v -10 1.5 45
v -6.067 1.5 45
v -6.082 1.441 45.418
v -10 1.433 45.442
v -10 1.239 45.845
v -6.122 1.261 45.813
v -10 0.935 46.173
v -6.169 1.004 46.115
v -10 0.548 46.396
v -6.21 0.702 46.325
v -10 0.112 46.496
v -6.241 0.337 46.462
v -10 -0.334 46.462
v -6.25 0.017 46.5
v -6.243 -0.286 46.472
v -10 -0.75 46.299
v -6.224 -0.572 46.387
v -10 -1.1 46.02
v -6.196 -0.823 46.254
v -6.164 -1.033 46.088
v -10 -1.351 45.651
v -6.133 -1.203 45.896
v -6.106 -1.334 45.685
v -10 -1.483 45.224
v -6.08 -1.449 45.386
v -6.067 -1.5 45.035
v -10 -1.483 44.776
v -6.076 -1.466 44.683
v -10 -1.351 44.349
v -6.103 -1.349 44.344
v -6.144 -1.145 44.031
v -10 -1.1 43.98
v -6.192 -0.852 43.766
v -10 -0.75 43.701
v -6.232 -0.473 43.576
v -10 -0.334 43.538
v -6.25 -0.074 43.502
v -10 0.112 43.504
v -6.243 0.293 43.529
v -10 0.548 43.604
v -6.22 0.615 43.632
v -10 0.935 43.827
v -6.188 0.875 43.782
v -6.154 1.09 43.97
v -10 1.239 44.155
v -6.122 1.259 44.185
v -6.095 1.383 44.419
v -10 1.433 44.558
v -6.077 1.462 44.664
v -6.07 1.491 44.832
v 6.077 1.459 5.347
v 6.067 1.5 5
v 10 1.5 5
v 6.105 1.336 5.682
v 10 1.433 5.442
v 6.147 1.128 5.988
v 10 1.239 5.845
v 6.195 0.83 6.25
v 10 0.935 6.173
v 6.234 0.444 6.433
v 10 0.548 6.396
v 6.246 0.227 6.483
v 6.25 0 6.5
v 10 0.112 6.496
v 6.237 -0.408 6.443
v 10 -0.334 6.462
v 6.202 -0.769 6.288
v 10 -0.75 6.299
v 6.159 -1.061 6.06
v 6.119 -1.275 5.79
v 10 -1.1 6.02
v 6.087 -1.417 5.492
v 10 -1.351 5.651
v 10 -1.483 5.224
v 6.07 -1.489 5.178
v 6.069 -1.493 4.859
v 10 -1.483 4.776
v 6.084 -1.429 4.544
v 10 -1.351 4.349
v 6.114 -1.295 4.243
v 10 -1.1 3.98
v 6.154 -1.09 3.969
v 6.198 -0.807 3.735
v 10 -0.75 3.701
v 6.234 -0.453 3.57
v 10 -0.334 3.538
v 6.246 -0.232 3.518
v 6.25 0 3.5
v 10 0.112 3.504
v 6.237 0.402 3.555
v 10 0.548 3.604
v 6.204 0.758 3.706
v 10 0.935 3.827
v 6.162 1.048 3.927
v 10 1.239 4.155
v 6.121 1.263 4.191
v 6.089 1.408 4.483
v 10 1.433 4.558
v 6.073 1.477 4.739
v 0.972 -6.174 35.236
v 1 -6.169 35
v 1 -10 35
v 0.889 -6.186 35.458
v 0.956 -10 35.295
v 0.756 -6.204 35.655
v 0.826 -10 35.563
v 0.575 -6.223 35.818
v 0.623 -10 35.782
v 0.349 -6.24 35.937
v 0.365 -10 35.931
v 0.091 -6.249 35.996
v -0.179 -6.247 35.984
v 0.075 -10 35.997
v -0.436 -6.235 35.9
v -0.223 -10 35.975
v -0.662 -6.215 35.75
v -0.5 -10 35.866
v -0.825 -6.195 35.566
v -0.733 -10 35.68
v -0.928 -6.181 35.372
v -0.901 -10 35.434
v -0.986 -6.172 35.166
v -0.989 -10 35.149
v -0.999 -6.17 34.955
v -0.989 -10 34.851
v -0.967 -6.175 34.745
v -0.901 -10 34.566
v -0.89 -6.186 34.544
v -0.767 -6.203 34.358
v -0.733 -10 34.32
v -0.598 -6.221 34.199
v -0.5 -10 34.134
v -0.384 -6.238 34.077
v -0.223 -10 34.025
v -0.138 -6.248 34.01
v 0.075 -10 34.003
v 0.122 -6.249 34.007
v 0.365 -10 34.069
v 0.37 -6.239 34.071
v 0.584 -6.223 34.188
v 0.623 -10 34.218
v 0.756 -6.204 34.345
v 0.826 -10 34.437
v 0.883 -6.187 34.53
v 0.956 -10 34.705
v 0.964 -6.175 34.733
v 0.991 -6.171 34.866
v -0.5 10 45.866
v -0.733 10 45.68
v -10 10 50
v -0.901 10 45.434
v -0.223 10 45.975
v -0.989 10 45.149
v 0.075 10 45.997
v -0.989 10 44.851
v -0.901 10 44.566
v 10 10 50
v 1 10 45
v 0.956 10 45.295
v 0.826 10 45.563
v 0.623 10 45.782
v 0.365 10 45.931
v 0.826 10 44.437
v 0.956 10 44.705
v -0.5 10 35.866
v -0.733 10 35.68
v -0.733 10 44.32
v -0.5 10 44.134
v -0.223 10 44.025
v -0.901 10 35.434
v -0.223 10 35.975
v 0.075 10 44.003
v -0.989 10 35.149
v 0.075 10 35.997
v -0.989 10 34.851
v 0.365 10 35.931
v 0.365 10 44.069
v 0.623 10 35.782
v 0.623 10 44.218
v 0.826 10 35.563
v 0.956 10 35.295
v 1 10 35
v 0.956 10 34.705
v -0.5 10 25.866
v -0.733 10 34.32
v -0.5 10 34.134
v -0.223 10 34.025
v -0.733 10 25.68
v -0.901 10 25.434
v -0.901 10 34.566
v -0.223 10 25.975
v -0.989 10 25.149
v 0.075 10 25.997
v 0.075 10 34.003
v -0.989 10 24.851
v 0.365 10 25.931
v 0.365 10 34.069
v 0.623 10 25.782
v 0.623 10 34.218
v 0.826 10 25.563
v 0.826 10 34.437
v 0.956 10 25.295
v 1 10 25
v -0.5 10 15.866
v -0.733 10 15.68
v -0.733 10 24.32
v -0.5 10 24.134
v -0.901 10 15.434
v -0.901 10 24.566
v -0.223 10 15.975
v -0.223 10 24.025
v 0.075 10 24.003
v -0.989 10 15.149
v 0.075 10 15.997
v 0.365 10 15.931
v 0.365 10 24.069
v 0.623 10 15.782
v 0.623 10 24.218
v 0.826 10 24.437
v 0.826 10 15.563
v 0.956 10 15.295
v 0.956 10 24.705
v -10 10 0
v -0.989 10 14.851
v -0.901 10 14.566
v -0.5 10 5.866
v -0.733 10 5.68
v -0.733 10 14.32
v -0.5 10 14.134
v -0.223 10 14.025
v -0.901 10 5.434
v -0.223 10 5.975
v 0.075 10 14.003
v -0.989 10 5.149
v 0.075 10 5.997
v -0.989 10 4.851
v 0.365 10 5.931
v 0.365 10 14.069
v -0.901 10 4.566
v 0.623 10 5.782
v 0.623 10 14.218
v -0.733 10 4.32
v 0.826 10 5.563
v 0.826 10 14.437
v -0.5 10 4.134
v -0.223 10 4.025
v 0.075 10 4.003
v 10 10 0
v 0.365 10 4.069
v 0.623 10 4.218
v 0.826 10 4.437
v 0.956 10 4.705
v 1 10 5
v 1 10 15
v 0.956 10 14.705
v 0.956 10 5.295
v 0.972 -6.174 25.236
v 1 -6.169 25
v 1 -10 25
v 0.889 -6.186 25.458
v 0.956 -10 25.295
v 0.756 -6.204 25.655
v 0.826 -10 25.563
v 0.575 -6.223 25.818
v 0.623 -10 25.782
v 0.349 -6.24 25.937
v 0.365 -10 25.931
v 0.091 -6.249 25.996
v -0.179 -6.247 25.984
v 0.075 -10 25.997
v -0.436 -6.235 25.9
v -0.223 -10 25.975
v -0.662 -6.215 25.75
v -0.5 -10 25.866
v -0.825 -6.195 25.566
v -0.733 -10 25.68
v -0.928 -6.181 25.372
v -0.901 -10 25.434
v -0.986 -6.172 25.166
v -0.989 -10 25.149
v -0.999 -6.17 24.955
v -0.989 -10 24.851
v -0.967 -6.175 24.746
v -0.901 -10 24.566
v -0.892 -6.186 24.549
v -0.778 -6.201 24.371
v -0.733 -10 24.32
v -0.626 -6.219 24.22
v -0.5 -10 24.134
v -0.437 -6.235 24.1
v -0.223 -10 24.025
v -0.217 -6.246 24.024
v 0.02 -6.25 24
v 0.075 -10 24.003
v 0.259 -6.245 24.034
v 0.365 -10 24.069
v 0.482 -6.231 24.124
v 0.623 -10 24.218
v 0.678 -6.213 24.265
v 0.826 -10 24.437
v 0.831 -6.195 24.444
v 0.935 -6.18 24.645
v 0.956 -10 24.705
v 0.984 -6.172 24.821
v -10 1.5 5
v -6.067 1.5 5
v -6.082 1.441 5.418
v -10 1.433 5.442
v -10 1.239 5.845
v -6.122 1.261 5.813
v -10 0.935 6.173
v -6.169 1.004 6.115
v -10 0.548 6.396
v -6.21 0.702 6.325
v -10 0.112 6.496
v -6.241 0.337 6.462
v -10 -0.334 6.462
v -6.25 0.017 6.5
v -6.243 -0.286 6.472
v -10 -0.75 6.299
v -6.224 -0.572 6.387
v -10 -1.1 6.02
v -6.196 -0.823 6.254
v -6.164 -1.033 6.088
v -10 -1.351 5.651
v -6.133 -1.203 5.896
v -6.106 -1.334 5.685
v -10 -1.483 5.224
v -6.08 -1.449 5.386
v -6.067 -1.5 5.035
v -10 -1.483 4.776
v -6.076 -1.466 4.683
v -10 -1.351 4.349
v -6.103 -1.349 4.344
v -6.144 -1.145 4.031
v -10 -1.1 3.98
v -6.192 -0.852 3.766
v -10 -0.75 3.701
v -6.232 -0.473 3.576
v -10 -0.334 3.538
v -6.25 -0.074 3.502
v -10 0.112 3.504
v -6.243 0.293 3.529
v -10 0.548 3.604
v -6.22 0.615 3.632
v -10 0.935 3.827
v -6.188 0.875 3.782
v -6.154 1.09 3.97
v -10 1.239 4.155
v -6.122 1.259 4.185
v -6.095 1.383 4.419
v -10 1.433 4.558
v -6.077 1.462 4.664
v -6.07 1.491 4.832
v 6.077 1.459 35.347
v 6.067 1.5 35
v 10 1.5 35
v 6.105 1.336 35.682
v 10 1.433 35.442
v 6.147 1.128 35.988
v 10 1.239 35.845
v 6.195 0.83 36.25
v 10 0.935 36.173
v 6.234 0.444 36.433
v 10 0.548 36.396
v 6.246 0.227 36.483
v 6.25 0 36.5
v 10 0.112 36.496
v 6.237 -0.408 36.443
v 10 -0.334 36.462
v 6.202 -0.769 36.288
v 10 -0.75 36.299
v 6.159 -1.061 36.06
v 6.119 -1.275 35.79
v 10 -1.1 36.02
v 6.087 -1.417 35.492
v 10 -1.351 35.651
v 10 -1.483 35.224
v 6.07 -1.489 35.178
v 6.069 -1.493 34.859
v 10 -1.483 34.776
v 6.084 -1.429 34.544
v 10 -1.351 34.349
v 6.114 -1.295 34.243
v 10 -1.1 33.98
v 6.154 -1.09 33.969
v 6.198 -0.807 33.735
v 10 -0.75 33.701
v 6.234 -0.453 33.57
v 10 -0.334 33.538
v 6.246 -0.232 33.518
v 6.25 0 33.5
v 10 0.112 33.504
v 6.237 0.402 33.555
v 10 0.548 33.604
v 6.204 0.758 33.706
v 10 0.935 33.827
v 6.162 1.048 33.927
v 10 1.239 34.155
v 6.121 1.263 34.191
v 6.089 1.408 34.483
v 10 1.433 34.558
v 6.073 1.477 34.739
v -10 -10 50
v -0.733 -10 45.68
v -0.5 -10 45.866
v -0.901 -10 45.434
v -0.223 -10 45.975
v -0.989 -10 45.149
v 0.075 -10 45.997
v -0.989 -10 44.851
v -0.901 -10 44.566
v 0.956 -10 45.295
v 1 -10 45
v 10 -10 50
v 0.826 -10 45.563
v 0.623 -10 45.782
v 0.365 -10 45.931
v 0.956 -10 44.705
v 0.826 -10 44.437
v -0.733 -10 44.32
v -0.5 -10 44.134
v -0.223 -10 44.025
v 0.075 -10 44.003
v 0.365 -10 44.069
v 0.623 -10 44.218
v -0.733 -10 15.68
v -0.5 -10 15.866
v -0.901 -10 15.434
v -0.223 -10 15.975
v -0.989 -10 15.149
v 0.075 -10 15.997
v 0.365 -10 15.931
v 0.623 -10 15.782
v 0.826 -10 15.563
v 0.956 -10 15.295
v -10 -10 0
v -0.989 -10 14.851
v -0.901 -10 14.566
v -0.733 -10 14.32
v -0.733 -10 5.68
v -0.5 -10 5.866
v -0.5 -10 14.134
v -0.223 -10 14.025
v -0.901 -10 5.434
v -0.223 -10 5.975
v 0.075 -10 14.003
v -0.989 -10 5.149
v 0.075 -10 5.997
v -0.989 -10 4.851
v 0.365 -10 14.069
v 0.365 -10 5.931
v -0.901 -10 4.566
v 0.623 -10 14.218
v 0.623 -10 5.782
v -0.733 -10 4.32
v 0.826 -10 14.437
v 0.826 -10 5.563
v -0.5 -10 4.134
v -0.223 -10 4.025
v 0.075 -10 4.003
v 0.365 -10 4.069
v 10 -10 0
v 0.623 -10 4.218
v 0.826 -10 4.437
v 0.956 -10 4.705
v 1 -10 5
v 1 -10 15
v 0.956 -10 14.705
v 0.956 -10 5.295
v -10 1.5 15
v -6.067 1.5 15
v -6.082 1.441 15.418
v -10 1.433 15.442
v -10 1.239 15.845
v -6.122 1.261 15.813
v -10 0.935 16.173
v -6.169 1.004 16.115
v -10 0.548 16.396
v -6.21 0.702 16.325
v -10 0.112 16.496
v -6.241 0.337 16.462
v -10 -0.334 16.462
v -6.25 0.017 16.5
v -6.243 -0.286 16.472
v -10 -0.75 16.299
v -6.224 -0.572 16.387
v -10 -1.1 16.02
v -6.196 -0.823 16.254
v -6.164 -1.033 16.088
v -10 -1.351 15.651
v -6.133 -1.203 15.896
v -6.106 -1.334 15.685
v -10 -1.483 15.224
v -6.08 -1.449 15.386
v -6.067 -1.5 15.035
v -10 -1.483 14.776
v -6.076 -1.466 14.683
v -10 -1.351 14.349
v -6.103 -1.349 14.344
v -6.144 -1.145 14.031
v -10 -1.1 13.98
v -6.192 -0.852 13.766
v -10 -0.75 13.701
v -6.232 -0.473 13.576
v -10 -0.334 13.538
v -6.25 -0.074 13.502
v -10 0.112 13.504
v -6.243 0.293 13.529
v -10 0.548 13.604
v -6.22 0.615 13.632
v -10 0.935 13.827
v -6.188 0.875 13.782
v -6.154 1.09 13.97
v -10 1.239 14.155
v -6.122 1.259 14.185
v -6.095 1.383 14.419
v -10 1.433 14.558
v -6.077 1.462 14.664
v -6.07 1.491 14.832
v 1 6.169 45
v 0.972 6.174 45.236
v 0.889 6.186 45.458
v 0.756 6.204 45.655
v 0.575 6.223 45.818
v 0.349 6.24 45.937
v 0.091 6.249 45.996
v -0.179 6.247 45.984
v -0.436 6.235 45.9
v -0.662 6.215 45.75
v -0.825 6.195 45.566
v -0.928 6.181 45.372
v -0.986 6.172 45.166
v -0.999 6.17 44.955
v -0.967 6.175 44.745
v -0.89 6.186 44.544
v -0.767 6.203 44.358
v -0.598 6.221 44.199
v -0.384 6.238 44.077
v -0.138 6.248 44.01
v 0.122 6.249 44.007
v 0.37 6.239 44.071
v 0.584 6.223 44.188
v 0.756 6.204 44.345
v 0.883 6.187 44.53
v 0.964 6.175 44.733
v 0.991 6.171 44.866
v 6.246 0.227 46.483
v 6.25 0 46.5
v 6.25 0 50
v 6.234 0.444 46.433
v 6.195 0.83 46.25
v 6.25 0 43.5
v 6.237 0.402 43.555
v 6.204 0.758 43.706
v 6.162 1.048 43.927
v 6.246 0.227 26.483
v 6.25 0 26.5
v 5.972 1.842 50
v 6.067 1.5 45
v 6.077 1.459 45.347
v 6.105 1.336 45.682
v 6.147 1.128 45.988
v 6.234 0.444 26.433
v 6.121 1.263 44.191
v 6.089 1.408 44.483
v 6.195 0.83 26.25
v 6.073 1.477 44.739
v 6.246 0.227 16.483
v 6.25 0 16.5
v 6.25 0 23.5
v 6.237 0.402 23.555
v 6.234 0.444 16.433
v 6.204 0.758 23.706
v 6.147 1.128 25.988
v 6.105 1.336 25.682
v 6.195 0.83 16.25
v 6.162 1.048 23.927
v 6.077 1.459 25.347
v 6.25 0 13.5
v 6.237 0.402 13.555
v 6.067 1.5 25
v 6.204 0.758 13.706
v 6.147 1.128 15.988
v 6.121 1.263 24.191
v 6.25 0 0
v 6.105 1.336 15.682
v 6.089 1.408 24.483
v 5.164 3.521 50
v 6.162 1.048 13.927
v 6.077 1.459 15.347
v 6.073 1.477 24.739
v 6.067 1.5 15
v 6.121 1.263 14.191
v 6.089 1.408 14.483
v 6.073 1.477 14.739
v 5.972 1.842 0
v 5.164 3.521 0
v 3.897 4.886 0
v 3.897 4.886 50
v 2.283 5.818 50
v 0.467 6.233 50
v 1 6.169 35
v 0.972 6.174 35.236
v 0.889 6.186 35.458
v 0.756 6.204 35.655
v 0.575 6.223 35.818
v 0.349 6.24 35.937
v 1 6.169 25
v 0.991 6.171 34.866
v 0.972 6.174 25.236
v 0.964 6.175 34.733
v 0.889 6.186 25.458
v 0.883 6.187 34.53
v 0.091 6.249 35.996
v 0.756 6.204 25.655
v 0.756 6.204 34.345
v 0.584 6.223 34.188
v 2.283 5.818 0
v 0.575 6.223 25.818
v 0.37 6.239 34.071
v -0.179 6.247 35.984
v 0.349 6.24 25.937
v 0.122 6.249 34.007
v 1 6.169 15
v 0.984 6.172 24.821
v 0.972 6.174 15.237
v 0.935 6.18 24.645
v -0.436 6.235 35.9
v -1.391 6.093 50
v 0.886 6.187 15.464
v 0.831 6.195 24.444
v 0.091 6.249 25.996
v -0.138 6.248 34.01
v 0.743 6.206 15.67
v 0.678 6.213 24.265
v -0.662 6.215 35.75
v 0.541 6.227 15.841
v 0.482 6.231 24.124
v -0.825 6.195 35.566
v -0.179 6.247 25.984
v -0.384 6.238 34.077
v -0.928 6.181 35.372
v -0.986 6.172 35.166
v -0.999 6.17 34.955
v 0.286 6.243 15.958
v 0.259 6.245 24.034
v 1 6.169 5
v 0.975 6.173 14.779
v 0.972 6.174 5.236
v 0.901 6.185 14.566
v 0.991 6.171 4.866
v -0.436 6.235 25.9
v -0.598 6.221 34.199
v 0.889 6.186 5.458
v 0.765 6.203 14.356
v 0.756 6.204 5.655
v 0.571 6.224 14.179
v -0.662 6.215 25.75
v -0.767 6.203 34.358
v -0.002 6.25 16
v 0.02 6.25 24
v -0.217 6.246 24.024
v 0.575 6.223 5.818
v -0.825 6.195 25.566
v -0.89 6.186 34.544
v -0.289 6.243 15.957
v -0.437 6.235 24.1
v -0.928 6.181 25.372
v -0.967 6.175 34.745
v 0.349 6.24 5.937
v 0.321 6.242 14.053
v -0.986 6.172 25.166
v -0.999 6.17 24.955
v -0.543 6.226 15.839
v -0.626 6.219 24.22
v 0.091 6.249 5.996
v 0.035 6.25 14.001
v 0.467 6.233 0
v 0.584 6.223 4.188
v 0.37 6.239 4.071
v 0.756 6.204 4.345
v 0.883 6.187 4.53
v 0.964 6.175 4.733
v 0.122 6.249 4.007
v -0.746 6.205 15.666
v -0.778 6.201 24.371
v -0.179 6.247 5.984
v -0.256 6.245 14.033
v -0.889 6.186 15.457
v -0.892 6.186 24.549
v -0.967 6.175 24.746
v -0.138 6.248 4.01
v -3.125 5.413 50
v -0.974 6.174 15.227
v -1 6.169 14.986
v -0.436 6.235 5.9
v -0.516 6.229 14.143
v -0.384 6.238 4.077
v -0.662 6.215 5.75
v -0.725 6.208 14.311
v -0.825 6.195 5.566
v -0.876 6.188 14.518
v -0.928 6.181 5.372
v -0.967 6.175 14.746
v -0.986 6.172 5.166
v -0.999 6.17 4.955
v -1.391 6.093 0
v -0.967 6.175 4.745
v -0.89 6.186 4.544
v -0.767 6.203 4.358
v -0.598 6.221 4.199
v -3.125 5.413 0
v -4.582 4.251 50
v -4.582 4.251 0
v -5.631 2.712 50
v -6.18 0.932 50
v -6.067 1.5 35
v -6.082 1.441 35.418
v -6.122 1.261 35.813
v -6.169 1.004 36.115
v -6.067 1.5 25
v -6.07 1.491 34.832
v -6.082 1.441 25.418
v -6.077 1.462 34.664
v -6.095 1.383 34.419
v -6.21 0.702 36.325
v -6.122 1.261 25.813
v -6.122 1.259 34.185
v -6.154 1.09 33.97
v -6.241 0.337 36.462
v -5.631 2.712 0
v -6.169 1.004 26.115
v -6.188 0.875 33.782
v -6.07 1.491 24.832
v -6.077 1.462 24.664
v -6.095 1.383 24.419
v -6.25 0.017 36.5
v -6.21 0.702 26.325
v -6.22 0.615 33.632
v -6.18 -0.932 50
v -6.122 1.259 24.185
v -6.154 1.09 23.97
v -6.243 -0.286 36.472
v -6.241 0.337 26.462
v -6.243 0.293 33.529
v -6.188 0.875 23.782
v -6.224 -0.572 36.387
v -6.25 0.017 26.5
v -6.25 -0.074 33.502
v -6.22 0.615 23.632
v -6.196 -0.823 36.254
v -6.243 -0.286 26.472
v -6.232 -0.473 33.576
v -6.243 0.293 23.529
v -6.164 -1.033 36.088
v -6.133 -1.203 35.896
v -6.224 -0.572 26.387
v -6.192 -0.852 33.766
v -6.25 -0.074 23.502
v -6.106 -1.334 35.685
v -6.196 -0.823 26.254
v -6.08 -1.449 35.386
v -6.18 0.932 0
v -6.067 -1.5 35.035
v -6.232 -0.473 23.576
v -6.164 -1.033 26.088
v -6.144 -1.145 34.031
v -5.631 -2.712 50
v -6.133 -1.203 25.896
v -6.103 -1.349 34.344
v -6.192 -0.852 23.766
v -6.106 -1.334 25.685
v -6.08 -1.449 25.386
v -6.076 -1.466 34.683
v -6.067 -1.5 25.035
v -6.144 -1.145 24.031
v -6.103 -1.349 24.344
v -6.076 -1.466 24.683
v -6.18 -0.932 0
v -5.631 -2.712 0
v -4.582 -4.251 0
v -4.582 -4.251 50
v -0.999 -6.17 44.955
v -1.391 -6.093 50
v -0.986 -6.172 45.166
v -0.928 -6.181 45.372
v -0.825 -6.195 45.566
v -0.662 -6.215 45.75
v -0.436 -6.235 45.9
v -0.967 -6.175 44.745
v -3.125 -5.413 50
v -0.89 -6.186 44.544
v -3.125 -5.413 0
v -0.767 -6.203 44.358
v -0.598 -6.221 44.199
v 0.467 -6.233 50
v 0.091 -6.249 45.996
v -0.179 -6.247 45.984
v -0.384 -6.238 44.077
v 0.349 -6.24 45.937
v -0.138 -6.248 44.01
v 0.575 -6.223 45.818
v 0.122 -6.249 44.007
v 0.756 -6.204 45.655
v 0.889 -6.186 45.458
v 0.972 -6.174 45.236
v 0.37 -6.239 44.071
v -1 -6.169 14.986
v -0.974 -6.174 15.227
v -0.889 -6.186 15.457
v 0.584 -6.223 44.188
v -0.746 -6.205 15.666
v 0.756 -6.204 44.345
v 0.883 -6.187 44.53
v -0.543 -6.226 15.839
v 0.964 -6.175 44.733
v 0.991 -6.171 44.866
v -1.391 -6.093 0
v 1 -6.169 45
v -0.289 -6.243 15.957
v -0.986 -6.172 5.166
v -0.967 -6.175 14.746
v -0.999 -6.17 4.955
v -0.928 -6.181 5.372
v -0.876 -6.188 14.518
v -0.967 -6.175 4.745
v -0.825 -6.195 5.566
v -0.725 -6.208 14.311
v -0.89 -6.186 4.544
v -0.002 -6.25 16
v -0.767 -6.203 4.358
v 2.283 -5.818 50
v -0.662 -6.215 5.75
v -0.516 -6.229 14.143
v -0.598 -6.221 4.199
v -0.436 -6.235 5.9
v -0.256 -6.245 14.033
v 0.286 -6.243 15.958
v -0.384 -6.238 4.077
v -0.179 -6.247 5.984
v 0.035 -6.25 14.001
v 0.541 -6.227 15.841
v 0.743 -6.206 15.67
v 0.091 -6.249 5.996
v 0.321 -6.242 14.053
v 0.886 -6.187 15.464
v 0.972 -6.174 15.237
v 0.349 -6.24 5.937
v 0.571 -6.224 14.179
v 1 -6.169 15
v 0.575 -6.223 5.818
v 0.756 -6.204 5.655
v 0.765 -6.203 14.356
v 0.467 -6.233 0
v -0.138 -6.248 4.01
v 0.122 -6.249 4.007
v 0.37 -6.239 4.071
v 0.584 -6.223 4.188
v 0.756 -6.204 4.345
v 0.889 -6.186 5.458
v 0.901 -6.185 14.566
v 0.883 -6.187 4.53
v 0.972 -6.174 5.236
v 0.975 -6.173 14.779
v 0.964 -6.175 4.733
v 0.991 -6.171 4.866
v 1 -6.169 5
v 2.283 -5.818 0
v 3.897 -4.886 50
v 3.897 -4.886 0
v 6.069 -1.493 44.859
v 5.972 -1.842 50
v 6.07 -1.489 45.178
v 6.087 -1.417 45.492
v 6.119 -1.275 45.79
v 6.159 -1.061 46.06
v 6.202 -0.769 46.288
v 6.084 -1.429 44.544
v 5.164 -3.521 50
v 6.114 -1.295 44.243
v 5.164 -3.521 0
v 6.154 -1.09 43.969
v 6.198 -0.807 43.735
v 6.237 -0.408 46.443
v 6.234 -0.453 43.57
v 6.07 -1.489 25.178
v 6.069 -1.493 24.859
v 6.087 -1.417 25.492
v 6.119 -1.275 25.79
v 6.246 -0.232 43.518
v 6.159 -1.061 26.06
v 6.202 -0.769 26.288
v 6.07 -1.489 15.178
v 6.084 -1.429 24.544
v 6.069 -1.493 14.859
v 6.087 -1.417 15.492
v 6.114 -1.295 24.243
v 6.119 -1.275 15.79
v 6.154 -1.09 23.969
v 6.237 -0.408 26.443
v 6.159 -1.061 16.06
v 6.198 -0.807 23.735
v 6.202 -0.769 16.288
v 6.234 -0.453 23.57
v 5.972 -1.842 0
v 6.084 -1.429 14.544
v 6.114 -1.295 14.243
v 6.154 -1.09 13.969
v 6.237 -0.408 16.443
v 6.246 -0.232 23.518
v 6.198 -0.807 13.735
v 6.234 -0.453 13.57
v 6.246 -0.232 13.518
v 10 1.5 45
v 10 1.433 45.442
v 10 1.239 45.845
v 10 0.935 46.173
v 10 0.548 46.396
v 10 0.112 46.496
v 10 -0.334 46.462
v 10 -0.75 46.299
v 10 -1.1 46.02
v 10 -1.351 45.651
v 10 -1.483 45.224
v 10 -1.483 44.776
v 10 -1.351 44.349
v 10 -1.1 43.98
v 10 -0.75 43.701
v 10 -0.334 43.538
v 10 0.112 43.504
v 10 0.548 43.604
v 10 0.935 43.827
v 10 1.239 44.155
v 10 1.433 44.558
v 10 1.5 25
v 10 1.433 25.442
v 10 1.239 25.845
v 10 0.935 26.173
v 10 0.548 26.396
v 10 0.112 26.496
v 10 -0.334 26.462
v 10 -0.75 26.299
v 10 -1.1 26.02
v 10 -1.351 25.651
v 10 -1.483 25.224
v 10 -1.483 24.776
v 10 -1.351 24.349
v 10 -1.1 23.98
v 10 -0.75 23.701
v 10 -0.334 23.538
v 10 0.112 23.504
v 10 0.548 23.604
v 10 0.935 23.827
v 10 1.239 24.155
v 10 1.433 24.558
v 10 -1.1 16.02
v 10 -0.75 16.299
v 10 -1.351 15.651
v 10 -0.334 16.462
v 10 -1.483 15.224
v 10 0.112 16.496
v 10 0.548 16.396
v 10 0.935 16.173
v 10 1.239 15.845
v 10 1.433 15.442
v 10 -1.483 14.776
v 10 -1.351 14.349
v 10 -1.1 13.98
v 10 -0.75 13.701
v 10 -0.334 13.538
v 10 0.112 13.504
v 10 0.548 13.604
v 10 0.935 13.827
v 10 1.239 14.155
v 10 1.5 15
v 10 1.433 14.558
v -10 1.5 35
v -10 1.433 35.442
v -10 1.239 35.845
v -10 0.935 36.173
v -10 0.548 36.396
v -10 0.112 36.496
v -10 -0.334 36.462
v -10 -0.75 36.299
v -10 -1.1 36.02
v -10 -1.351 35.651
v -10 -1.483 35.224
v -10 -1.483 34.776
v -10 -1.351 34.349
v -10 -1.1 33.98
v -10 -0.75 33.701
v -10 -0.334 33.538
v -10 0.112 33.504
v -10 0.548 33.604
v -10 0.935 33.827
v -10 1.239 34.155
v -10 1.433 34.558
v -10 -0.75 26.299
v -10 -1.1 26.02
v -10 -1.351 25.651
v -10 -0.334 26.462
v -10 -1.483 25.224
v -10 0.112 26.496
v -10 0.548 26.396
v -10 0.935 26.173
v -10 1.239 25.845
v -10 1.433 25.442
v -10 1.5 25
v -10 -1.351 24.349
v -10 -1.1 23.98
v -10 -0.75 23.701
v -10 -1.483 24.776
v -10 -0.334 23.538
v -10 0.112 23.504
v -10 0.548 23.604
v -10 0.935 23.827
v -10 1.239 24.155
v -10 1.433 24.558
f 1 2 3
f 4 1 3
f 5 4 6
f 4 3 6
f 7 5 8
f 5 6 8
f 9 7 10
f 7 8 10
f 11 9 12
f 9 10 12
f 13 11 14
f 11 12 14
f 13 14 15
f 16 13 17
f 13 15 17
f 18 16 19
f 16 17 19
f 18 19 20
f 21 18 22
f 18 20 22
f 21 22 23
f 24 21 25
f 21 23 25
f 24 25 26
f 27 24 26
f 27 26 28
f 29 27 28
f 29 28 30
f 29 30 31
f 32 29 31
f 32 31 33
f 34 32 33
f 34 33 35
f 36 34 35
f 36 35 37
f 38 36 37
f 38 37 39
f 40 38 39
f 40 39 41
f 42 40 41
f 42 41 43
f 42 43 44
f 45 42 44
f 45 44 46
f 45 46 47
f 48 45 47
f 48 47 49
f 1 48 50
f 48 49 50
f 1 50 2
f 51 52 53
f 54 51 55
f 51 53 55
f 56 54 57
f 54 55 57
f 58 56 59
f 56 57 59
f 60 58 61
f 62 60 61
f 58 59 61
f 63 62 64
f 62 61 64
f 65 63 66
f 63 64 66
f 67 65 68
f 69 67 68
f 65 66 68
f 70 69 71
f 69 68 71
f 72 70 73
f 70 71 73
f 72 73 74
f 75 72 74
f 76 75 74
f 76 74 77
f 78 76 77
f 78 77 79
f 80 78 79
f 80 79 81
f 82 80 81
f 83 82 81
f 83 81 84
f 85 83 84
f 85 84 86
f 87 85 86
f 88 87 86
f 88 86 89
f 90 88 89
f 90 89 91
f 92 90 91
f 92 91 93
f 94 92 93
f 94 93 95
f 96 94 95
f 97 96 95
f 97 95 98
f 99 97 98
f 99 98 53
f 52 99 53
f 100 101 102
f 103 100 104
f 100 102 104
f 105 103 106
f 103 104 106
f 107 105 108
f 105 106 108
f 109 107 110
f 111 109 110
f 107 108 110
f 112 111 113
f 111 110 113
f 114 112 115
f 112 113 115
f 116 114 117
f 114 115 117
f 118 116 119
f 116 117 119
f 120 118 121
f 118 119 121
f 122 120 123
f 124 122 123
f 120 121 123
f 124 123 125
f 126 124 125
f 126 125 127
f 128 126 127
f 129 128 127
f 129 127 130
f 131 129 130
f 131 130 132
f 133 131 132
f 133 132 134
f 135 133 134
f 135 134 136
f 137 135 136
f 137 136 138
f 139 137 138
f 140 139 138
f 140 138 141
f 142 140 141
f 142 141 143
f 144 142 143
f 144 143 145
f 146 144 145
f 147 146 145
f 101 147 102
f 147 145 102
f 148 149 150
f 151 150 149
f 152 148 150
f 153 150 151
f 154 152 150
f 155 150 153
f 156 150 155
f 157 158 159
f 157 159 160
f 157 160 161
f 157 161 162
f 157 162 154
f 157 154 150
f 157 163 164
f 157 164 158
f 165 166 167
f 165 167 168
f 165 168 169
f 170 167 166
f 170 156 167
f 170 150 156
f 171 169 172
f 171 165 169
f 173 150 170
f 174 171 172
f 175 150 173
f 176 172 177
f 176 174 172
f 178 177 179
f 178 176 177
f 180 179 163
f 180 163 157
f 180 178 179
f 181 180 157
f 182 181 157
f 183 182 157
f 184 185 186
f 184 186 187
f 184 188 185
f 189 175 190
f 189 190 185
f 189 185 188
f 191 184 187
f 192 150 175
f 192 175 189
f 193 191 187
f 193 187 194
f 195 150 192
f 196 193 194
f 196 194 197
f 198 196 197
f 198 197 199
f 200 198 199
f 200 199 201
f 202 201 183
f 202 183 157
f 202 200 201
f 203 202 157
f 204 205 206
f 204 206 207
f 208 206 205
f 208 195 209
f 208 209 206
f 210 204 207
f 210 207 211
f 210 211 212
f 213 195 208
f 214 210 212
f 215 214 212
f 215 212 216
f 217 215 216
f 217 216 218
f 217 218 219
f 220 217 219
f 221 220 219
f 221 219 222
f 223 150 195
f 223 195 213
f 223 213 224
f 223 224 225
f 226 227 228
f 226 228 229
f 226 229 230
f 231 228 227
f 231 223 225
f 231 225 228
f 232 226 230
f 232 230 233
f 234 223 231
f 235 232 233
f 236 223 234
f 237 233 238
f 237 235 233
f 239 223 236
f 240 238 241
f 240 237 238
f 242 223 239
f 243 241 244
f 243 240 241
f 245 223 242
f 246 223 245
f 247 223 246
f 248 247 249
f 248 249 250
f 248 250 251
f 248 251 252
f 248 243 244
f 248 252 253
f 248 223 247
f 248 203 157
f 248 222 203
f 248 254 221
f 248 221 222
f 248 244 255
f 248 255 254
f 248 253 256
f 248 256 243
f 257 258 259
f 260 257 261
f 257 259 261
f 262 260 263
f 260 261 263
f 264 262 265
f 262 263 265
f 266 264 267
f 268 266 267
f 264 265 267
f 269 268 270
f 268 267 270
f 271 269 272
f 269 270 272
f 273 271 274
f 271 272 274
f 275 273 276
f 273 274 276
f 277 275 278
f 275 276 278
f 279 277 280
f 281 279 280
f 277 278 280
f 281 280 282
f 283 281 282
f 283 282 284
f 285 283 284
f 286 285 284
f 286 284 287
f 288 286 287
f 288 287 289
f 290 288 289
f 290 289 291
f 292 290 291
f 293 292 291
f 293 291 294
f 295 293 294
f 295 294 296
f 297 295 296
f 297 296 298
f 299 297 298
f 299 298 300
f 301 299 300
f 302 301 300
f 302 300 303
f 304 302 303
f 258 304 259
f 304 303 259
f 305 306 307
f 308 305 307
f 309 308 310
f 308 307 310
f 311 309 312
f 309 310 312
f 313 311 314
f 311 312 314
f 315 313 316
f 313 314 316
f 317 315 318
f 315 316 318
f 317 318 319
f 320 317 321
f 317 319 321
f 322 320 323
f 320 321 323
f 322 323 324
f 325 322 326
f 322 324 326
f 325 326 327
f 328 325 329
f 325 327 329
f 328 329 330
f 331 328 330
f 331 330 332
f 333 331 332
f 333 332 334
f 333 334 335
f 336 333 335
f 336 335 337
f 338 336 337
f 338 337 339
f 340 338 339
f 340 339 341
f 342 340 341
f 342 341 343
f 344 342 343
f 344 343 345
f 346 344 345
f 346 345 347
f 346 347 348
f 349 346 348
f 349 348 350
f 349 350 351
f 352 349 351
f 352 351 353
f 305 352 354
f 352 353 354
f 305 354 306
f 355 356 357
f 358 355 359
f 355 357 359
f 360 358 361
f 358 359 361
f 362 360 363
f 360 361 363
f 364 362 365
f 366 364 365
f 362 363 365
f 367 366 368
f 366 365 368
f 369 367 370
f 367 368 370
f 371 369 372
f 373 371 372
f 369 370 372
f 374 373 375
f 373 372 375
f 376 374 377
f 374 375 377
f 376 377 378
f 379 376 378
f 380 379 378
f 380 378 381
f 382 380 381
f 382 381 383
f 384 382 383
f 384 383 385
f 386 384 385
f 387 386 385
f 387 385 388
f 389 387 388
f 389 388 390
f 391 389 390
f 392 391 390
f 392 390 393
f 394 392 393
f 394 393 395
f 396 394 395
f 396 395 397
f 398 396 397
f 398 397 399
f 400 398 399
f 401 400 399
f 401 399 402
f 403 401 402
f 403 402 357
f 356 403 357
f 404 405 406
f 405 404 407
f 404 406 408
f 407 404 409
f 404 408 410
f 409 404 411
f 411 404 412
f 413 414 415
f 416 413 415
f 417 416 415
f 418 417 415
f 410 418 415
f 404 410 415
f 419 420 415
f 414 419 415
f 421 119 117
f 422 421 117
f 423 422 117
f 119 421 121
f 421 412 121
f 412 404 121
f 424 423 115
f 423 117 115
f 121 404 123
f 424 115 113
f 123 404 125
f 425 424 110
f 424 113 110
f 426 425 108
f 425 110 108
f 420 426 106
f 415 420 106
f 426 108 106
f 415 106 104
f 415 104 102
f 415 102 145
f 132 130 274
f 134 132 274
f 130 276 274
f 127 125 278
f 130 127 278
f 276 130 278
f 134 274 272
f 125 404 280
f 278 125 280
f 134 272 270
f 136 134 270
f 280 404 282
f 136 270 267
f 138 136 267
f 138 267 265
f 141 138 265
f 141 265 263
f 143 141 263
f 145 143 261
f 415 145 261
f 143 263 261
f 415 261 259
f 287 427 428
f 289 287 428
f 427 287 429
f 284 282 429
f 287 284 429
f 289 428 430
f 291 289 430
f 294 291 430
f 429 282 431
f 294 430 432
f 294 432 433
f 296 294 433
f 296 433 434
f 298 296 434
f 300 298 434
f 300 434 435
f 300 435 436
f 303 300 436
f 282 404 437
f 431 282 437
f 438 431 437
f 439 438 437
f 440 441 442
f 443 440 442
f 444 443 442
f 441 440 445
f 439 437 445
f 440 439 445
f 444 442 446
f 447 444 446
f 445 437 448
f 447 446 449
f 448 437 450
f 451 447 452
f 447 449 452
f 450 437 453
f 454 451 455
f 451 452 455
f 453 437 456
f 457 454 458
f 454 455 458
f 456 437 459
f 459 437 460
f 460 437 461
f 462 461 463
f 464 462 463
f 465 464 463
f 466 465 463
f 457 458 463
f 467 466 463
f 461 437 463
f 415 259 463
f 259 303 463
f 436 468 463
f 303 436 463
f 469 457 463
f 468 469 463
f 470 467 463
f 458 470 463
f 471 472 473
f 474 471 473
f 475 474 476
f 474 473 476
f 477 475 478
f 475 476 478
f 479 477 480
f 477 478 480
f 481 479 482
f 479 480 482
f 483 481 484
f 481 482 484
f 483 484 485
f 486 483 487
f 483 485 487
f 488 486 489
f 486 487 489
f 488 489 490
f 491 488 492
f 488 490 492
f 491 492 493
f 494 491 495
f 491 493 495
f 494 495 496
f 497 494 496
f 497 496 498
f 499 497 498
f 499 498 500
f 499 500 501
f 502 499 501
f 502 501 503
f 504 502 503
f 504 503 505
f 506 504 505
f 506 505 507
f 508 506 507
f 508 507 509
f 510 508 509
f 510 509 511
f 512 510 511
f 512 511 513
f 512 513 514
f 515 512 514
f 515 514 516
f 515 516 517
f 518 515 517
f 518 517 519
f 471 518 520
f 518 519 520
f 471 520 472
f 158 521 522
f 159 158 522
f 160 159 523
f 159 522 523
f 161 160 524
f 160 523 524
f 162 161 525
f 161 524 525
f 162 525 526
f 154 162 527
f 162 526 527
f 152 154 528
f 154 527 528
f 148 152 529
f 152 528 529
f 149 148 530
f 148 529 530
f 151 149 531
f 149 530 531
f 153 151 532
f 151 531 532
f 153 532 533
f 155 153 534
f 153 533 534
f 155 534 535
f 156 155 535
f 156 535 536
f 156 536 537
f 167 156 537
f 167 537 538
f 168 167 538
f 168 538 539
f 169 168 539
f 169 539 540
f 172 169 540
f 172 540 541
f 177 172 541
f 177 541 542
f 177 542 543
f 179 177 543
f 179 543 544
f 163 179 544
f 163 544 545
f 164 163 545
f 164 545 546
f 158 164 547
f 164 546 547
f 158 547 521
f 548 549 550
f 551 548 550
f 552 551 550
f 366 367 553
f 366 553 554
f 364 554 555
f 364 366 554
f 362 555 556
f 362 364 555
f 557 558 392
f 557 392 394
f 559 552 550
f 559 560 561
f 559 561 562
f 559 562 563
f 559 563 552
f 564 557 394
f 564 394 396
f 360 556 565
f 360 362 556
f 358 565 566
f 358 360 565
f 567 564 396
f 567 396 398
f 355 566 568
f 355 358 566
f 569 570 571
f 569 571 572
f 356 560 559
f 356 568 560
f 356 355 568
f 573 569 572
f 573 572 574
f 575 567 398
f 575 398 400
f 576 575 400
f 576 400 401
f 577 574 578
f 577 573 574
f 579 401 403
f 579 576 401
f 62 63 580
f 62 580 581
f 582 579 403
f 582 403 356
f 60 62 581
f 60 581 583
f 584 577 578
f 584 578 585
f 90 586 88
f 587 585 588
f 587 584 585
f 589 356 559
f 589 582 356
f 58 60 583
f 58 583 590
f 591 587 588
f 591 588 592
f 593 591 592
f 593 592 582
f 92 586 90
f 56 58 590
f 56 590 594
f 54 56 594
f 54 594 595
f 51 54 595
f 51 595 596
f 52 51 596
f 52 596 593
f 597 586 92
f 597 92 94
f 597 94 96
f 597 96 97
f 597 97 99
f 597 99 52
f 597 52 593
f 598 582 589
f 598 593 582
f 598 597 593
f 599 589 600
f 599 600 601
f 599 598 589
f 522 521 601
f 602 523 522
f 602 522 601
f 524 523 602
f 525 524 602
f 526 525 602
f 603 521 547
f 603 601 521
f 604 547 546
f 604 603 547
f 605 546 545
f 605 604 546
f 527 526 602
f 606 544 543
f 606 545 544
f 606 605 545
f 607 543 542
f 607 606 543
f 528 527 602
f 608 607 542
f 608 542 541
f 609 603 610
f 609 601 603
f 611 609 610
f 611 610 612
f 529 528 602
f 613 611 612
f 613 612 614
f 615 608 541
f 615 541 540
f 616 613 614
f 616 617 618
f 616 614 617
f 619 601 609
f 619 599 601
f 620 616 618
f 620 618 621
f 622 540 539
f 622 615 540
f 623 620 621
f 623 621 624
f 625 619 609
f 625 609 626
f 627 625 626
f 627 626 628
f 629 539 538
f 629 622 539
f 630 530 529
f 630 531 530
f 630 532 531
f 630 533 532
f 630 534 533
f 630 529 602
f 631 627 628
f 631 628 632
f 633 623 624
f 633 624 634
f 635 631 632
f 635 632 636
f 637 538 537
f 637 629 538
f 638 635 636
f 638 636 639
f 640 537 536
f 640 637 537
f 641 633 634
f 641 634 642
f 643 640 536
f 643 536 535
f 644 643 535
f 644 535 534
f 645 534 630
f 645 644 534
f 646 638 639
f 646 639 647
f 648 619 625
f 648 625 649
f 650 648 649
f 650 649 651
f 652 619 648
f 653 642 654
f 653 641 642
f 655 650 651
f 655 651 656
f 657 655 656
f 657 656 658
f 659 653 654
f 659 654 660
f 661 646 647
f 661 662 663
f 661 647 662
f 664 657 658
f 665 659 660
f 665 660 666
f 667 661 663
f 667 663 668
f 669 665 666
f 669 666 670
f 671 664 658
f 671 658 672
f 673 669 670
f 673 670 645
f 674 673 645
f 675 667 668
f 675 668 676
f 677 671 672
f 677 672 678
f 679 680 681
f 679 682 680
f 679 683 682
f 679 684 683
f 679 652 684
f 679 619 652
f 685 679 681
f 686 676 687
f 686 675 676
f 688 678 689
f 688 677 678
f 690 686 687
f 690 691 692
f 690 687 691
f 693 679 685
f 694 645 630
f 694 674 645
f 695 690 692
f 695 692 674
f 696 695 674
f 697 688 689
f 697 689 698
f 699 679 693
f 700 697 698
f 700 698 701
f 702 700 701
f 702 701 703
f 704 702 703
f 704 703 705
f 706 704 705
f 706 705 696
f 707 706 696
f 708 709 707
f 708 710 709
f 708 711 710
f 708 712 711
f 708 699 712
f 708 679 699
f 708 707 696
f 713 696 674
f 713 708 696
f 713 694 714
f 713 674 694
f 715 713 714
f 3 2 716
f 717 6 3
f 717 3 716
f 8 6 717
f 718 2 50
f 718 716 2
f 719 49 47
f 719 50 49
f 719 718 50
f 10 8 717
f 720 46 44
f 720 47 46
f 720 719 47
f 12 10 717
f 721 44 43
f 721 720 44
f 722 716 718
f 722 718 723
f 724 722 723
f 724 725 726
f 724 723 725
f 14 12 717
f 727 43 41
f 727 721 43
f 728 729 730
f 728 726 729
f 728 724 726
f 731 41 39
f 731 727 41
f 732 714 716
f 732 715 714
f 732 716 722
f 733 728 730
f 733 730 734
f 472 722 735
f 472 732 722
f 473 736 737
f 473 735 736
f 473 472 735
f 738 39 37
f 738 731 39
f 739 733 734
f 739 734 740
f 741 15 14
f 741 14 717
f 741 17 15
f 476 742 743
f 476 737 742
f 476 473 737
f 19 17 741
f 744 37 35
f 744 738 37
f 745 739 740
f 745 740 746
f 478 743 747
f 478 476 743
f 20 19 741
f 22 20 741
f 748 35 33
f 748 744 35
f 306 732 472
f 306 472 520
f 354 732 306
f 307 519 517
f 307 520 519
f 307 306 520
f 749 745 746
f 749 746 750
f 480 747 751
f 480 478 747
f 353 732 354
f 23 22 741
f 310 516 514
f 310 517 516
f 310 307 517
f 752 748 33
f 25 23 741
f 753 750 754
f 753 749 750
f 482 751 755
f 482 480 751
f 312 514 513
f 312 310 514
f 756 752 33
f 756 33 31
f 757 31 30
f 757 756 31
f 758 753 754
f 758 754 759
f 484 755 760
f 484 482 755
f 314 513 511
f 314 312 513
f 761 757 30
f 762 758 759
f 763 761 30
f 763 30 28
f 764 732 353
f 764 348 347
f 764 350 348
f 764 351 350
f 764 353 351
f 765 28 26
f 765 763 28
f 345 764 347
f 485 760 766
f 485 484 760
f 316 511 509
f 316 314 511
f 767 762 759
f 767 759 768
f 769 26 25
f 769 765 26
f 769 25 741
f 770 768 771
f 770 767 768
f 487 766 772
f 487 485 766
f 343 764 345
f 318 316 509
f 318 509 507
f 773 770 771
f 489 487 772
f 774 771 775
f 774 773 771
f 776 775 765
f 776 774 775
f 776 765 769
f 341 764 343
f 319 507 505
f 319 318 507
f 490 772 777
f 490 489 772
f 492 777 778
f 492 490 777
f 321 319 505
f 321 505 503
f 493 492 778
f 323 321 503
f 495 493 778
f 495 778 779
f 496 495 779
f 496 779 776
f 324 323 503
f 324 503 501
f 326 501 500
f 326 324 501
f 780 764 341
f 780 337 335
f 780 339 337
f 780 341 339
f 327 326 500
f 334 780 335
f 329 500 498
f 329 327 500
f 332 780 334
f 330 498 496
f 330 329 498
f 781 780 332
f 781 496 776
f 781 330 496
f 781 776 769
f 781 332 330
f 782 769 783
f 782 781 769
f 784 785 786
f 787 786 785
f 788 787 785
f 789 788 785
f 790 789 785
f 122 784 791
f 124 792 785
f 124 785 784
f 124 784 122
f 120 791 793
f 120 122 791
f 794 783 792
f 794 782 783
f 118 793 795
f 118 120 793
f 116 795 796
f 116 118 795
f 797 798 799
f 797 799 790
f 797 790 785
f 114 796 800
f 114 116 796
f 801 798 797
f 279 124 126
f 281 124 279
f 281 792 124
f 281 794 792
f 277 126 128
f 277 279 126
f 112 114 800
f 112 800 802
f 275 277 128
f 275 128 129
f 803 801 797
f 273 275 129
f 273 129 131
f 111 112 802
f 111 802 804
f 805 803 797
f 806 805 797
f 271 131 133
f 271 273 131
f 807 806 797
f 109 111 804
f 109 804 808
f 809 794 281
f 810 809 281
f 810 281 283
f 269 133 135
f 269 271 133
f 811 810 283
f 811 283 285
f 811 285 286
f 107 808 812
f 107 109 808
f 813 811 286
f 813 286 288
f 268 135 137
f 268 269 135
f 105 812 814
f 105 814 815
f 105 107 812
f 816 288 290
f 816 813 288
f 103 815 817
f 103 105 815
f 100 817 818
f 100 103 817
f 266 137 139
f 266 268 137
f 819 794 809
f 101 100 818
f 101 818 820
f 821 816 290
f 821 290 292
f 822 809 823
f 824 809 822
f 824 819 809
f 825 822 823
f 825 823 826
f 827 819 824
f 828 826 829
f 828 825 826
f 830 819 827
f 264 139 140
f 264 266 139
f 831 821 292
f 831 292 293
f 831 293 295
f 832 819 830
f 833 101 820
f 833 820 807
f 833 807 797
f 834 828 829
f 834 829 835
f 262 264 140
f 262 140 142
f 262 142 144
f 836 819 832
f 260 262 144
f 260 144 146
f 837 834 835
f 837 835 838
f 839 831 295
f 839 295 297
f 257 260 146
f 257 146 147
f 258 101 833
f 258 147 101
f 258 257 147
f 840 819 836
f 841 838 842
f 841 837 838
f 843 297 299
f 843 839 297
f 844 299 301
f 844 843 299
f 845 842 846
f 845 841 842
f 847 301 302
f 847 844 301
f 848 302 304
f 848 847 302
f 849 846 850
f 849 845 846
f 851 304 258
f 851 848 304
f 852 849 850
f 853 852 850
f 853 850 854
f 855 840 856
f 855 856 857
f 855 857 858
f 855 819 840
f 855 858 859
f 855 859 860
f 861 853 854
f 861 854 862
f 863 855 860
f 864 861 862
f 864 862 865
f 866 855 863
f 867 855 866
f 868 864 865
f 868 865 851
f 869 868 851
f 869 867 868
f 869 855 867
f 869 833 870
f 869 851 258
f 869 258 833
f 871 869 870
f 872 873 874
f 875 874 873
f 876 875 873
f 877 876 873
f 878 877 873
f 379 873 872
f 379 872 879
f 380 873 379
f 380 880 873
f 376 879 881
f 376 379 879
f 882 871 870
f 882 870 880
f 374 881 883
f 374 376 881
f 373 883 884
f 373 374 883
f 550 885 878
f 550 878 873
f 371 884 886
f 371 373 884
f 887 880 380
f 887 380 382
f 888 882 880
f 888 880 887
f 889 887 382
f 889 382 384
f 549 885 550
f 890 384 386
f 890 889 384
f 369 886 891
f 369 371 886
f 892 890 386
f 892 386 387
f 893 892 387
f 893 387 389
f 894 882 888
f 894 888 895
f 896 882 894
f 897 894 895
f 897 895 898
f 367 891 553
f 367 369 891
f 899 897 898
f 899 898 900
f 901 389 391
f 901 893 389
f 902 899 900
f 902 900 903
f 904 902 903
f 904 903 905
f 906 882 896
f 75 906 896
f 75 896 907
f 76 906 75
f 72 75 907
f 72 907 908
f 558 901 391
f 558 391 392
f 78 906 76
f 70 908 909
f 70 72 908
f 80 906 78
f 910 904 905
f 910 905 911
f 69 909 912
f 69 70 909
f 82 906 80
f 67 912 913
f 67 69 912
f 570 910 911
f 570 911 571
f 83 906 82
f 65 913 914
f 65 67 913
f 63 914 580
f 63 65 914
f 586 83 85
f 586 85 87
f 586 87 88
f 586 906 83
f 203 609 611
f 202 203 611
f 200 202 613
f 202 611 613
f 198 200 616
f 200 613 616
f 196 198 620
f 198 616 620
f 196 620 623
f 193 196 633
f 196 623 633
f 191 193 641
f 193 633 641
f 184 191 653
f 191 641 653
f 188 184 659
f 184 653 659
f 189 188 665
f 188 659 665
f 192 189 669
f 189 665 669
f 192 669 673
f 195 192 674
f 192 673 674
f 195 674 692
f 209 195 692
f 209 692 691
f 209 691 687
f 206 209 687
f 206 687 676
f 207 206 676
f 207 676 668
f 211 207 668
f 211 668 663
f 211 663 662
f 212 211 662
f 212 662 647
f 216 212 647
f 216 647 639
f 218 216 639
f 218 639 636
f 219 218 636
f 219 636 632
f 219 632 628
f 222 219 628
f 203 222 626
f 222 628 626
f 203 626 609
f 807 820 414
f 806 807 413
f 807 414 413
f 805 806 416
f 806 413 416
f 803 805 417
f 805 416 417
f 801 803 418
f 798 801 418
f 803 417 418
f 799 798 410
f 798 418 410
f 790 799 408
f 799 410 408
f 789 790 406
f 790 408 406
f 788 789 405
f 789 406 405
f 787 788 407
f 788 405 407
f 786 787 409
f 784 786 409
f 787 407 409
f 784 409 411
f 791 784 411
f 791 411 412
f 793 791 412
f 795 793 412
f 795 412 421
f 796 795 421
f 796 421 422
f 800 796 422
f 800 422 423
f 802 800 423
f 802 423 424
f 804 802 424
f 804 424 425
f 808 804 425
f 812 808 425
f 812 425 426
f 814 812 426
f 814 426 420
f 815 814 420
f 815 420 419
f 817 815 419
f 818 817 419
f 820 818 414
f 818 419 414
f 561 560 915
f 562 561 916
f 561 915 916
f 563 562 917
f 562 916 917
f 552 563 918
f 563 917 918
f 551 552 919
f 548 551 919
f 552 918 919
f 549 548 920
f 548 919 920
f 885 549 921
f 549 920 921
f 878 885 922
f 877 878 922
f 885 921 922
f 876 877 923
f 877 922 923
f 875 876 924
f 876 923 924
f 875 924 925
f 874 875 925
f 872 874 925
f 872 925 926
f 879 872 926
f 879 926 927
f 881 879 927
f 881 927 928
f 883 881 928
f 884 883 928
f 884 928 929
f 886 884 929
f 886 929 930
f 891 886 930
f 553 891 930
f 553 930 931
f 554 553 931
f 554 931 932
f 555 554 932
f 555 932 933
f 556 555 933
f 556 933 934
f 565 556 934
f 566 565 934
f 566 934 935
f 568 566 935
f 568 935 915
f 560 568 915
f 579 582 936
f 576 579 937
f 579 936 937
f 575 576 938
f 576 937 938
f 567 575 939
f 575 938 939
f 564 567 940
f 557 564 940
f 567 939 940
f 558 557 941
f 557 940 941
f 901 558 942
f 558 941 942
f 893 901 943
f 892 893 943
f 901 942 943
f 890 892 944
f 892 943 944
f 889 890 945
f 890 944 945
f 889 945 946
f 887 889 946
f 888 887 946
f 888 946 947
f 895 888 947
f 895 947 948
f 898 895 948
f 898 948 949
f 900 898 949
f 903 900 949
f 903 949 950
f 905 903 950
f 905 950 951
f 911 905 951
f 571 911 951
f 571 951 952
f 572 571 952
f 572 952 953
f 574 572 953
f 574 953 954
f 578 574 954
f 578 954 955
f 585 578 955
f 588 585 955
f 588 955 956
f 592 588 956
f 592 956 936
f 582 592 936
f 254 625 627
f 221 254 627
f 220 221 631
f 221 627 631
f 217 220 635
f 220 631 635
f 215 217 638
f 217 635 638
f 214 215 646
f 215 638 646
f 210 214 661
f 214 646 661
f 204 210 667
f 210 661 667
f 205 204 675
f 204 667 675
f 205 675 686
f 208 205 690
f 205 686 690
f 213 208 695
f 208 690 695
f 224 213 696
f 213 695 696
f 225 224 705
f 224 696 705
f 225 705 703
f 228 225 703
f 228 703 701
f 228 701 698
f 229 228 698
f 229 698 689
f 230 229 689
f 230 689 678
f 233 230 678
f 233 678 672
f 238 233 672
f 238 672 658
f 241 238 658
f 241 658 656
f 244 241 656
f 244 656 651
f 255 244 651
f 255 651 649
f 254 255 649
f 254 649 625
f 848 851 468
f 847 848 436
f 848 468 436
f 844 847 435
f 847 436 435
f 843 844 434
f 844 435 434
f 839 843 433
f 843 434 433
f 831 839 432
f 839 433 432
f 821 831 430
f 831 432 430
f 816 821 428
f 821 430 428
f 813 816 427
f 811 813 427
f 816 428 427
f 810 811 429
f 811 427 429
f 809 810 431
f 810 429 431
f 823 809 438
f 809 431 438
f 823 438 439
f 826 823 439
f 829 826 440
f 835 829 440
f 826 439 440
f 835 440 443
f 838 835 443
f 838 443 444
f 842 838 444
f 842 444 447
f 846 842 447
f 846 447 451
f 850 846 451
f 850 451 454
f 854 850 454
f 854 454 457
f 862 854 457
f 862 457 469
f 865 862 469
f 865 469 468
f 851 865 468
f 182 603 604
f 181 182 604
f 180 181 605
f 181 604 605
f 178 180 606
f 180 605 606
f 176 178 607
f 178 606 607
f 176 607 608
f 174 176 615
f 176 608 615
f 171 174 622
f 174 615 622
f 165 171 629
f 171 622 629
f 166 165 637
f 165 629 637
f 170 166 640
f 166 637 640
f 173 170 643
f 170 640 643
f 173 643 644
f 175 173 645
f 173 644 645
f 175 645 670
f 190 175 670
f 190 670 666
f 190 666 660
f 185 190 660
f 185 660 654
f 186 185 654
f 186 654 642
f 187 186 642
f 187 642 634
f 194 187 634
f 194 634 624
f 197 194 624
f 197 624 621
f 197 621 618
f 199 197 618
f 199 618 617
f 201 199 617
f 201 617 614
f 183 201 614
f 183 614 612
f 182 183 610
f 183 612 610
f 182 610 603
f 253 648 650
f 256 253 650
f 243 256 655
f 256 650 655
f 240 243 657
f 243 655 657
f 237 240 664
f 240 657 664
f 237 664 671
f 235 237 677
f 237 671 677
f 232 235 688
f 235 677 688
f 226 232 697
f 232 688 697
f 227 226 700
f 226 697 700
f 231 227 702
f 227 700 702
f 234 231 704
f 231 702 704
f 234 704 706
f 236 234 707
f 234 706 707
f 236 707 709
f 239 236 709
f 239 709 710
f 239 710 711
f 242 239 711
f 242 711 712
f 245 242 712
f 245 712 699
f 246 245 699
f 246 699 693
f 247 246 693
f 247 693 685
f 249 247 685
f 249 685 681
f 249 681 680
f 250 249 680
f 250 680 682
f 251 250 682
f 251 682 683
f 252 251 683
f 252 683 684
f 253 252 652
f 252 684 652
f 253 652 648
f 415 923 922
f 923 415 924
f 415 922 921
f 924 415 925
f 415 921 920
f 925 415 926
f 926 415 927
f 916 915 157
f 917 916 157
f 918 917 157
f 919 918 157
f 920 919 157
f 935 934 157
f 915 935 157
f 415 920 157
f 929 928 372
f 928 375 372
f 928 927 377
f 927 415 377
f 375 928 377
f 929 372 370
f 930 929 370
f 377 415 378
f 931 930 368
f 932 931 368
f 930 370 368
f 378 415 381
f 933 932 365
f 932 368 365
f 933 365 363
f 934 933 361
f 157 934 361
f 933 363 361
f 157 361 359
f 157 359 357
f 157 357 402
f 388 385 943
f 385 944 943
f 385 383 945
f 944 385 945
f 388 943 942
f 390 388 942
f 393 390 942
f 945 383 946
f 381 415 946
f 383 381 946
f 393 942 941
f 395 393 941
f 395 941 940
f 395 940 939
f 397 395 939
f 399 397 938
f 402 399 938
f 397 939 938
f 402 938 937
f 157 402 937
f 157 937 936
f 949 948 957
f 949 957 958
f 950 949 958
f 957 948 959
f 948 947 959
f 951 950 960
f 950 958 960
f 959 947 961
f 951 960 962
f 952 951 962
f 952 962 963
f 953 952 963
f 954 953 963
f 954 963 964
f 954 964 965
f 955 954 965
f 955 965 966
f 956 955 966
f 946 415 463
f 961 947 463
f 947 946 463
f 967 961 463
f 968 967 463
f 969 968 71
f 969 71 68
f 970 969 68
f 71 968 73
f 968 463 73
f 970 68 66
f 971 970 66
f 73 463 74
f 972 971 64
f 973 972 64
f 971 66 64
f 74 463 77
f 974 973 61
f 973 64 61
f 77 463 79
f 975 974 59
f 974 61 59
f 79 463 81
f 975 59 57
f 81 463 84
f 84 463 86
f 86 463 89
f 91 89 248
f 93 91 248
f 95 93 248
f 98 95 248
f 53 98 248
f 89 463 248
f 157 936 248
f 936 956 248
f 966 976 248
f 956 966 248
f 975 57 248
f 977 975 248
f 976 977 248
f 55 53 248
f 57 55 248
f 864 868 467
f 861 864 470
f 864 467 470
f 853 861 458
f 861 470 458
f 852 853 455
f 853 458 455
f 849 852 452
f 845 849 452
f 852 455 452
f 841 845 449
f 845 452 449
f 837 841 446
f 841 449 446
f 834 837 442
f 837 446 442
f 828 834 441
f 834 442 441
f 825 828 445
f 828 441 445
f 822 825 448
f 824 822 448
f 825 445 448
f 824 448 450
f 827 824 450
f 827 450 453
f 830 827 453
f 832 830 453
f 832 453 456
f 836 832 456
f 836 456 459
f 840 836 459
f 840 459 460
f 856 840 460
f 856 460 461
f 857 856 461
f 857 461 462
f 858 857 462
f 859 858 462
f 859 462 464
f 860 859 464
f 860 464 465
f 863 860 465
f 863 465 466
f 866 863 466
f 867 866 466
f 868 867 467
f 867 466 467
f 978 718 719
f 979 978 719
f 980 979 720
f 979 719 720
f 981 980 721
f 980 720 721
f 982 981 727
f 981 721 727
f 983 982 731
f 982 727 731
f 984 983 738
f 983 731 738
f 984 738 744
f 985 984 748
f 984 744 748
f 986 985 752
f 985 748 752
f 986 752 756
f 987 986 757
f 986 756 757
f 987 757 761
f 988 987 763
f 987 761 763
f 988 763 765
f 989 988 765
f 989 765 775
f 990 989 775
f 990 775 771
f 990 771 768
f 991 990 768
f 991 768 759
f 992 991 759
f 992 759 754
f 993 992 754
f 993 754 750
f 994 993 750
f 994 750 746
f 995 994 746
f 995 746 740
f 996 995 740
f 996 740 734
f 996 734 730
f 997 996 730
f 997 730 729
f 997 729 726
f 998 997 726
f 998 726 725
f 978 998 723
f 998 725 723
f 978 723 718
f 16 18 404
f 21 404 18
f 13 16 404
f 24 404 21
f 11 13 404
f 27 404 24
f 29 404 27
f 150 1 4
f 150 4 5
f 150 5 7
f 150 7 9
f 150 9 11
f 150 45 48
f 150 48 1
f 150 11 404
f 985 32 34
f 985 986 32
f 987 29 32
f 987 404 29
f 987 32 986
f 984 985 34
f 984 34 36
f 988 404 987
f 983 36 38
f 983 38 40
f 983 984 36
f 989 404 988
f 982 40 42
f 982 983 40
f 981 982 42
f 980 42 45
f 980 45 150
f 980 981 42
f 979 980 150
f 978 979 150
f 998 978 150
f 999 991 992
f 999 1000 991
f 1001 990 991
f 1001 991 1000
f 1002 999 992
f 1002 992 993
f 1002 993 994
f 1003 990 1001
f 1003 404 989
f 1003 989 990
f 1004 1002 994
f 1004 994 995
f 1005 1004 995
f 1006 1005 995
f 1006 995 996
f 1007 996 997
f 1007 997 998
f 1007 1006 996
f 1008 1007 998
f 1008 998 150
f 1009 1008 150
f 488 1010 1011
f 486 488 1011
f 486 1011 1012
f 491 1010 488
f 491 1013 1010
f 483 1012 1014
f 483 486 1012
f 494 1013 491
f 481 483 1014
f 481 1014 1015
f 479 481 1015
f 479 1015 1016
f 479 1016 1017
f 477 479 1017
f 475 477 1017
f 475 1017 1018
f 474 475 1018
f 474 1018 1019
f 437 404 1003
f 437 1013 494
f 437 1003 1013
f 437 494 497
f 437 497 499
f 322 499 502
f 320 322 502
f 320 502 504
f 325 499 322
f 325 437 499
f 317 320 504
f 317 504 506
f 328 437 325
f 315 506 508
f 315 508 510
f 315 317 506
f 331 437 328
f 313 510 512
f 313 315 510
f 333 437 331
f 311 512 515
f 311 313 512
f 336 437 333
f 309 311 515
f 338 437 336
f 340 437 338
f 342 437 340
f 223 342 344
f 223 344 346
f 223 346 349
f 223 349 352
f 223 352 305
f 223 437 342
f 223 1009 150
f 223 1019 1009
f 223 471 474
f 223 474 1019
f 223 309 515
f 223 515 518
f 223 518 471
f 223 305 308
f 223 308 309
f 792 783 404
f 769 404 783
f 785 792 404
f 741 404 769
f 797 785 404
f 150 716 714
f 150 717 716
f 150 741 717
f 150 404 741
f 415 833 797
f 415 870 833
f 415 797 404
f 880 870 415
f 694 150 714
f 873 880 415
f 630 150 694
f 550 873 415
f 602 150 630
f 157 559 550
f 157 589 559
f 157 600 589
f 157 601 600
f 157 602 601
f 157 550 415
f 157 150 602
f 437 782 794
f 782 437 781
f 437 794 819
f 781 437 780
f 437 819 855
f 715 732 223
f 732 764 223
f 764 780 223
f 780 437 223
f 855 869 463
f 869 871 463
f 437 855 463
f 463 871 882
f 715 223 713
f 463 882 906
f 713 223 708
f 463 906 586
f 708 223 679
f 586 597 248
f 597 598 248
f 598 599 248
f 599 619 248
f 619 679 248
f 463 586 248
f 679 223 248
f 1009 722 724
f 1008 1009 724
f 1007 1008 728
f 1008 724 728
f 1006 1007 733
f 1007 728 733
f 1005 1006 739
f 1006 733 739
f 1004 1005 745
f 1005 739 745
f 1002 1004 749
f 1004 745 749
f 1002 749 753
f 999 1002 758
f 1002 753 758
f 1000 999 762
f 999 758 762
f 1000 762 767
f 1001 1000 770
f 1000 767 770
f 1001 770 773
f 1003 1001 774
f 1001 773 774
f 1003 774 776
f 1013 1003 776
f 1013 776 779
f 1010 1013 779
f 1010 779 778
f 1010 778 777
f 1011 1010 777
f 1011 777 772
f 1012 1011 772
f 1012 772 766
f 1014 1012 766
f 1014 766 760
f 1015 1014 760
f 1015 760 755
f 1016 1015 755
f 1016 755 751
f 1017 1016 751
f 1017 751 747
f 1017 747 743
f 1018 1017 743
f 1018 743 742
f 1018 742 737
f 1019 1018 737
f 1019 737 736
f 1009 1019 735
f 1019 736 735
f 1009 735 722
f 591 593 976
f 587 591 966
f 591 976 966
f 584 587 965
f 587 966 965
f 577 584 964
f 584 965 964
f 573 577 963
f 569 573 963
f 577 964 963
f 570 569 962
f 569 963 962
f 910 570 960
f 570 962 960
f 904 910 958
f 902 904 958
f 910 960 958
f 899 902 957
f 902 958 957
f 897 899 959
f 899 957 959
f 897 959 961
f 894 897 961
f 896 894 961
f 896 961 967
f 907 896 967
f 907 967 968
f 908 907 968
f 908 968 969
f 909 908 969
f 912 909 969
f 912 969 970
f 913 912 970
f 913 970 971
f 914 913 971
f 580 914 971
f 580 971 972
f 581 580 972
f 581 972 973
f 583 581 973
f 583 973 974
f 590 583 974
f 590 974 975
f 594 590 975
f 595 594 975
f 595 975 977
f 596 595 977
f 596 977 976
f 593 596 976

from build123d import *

# Parameters (mm, degrees)
F0_W     = 20
F0_H     = 20
F0_R     = 6.25
F1_DEPTH = 50
F2_R     = 1.5
F3_DEPTH = 20
F4_R     = 1
F5_DEPTH = 20


with BuildPart() as f1:
    # F0 (on Top) → F1 (new body)
    with BuildSketch(Plane.XY):
        Rectangle(F0_W, F0_H)
        Circle(F0_R, mode=Mode.SUBTRACT)
    extrude(amount=F1_DEPTH)

    # F2 (on face) → F3 (cut, through all)
    with BuildSketch(Plane.YZ.offset(10)):
        with Locations((0, 45)):
            Circle(F2_R)
        with Locations((0, 35)):
            Circle(F2_R)
        with Locations((0, 25)):
            Circle(F2_R)
        with Locations((0, 15)):
            Circle(F2_R)
        with Locations((0, 5)):
            Circle(F2_R)
    extrude(amount=-F3_DEPTH, mode=Mode.SUBTRACT)

    # F4 (on face) → F5 (cut, through all)
    with BuildSketch(Plane.XZ.offset(10)):
        with Locations((0, 45)):
            Circle(F4_R)
        with Locations((0, 35)):
            Circle(F4_R)
        with Locations((0, 25)):
            Circle(F4_R)
        with Locations((0, 15)):
            Circle(F4_R)
        with Locations((0, 5)):
            Circle(F4_R)
    extrude(amount=-F5_DEPTH, mode=Mode.SUBTRACT)


solid = f1.part
